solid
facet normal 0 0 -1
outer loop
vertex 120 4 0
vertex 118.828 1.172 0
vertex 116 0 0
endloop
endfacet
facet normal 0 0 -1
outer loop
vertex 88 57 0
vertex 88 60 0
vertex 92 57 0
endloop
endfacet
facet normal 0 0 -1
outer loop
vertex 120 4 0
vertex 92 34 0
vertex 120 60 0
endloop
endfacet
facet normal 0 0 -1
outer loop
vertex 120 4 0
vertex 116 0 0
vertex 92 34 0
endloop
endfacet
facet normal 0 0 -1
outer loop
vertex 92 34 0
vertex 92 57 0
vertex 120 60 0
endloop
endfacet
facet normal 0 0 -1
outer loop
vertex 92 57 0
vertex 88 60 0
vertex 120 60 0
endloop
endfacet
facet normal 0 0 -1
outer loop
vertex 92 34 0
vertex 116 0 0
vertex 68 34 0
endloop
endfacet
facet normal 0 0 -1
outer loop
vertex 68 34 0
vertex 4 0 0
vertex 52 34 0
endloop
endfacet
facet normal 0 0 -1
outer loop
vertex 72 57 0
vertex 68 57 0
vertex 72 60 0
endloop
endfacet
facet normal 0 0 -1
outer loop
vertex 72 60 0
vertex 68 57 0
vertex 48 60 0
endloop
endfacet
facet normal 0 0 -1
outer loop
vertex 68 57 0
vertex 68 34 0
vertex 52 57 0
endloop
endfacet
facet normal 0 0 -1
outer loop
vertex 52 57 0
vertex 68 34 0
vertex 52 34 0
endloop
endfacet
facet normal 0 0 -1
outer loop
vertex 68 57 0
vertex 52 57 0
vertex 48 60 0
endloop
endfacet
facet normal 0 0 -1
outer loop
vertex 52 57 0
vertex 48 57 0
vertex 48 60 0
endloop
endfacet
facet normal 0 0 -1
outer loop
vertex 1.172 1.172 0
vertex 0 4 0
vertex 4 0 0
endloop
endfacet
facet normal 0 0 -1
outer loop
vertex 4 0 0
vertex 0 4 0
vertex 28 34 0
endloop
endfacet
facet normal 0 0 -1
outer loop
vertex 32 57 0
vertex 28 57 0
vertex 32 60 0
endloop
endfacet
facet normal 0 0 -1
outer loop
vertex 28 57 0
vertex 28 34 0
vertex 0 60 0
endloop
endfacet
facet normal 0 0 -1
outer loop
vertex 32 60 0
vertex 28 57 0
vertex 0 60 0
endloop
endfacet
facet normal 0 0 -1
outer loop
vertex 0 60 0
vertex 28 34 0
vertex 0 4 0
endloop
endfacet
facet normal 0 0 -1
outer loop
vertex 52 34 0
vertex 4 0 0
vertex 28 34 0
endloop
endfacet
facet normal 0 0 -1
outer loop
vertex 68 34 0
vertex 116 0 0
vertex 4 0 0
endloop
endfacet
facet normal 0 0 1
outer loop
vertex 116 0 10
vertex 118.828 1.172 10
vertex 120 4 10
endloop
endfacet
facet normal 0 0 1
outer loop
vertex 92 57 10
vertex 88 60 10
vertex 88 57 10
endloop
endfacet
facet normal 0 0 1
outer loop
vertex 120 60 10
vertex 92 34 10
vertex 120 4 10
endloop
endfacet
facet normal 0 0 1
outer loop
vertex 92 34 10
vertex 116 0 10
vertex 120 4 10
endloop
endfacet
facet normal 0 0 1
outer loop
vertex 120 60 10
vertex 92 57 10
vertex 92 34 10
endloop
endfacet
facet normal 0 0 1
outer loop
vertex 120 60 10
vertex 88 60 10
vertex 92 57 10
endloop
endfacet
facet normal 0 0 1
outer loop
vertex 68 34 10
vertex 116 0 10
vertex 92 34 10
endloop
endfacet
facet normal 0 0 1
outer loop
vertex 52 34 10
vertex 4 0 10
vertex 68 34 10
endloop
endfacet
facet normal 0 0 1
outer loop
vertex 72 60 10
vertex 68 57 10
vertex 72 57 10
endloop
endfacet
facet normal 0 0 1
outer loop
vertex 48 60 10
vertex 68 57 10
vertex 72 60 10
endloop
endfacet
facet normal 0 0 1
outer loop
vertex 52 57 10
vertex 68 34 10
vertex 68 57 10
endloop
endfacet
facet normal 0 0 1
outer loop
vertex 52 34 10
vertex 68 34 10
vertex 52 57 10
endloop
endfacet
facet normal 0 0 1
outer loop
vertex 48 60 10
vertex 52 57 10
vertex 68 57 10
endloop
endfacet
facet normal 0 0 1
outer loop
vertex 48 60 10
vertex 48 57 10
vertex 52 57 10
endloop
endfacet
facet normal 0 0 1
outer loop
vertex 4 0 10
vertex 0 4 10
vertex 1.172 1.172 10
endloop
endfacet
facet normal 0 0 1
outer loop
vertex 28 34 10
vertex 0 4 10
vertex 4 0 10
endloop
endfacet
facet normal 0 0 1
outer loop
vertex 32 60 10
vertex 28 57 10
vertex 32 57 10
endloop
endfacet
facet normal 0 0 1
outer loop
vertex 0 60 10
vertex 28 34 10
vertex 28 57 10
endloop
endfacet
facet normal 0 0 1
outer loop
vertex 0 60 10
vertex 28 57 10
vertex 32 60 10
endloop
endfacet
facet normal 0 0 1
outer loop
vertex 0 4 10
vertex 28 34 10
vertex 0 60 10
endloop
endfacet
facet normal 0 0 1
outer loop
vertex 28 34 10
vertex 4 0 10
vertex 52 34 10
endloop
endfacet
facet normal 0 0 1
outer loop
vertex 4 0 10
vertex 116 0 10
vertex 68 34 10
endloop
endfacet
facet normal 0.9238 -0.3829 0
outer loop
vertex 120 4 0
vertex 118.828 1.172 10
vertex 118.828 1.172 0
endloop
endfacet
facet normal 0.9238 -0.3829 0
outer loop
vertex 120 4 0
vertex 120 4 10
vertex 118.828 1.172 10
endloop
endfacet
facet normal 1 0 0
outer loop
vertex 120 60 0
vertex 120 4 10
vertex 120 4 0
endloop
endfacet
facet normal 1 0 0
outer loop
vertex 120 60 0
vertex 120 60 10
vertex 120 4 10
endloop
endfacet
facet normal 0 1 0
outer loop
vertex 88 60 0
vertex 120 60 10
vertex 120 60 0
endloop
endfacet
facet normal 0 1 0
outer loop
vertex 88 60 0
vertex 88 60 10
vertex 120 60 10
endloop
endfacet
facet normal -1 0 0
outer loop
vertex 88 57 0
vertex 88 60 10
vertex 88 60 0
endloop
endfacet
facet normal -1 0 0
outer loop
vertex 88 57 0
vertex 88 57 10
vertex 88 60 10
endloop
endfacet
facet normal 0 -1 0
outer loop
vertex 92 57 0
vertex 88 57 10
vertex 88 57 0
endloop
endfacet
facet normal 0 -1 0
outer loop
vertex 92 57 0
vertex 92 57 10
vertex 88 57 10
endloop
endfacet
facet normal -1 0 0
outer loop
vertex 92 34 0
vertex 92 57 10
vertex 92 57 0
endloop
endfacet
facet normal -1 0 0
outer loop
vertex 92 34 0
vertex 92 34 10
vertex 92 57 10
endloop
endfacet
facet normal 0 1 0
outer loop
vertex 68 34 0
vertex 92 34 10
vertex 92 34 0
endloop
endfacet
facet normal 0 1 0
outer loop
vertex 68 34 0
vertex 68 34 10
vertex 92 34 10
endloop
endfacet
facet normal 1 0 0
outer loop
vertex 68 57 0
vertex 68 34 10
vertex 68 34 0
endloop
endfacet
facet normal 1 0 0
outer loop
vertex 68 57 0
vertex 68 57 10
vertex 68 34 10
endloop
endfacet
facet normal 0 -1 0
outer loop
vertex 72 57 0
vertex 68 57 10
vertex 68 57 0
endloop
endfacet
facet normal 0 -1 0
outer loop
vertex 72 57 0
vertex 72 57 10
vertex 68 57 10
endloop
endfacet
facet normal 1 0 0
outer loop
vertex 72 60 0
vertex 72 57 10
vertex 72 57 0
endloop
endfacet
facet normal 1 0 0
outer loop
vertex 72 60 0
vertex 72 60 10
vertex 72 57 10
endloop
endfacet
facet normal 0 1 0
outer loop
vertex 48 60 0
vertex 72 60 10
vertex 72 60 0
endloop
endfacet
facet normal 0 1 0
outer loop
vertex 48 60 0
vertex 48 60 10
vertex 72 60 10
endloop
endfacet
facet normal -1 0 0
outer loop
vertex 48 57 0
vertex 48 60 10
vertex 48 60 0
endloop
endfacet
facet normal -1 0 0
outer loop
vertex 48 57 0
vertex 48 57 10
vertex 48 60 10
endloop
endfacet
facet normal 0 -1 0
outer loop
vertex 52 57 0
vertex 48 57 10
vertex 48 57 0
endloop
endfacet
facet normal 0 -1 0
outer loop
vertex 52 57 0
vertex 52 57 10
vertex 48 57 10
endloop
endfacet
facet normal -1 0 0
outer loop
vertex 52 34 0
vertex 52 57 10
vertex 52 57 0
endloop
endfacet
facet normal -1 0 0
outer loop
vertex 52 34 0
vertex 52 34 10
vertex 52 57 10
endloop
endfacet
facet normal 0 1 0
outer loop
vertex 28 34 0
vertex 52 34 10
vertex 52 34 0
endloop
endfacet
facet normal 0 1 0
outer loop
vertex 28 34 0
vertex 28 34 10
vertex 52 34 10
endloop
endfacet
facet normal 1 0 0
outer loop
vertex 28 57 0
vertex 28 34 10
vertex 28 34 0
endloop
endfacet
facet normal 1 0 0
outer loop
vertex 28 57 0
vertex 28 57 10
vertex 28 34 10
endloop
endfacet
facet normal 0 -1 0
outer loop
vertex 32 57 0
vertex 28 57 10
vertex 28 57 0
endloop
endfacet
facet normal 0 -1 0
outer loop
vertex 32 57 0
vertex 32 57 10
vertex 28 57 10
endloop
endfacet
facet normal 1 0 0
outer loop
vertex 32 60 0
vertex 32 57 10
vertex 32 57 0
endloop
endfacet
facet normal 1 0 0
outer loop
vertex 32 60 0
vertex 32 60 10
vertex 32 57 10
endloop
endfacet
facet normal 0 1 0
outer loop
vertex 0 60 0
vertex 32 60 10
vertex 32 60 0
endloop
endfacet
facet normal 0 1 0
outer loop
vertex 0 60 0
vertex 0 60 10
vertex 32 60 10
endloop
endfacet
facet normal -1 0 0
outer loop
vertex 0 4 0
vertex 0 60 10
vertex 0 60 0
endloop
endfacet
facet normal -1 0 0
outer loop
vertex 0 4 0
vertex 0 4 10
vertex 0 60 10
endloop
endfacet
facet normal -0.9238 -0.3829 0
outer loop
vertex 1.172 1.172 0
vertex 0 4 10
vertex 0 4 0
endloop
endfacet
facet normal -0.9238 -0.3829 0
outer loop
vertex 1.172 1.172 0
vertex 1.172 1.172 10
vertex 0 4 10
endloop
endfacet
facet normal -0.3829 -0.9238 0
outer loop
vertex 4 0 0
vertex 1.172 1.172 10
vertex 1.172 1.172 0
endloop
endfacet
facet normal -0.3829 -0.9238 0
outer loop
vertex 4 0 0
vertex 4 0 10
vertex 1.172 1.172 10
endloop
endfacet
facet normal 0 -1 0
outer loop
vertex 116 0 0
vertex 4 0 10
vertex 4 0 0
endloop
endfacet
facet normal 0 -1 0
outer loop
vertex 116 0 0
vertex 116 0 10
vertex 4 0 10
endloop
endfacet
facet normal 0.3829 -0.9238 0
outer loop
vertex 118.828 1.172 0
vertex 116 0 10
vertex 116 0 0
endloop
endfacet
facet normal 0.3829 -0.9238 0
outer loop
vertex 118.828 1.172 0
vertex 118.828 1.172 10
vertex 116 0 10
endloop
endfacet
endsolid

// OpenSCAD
$fn = 32;

// ----------------------------------------------------------------------
// Oversize slot bar: 120 mm bar with 2 oversize windows
// ----------------------------------------------------------------------

// --- parameters (mm) ---
profile_height = 10;      // extrusion height
profile_points = 24;      // points of the closed outline

profile = [[0, 4], [1.172, 1.172], [4, 0], [116, 0], [118.828, 1.172], [120, 4], [120, 60], [88, 60], [88, 57], [92, 57], [92, 34], [68, 34], [68, 57], [72, 57], [72, 60], [48, 60], [48, 57], [52, 57], [52, 34], [28, 34], [28, 57], [32, 57], [32, 60], [0, 60]];  // single closed polygon, 24 points, counter clockwise

// --- the one profile operation ---
linear_extrude(height = profile_height) polygon(points = profile);
